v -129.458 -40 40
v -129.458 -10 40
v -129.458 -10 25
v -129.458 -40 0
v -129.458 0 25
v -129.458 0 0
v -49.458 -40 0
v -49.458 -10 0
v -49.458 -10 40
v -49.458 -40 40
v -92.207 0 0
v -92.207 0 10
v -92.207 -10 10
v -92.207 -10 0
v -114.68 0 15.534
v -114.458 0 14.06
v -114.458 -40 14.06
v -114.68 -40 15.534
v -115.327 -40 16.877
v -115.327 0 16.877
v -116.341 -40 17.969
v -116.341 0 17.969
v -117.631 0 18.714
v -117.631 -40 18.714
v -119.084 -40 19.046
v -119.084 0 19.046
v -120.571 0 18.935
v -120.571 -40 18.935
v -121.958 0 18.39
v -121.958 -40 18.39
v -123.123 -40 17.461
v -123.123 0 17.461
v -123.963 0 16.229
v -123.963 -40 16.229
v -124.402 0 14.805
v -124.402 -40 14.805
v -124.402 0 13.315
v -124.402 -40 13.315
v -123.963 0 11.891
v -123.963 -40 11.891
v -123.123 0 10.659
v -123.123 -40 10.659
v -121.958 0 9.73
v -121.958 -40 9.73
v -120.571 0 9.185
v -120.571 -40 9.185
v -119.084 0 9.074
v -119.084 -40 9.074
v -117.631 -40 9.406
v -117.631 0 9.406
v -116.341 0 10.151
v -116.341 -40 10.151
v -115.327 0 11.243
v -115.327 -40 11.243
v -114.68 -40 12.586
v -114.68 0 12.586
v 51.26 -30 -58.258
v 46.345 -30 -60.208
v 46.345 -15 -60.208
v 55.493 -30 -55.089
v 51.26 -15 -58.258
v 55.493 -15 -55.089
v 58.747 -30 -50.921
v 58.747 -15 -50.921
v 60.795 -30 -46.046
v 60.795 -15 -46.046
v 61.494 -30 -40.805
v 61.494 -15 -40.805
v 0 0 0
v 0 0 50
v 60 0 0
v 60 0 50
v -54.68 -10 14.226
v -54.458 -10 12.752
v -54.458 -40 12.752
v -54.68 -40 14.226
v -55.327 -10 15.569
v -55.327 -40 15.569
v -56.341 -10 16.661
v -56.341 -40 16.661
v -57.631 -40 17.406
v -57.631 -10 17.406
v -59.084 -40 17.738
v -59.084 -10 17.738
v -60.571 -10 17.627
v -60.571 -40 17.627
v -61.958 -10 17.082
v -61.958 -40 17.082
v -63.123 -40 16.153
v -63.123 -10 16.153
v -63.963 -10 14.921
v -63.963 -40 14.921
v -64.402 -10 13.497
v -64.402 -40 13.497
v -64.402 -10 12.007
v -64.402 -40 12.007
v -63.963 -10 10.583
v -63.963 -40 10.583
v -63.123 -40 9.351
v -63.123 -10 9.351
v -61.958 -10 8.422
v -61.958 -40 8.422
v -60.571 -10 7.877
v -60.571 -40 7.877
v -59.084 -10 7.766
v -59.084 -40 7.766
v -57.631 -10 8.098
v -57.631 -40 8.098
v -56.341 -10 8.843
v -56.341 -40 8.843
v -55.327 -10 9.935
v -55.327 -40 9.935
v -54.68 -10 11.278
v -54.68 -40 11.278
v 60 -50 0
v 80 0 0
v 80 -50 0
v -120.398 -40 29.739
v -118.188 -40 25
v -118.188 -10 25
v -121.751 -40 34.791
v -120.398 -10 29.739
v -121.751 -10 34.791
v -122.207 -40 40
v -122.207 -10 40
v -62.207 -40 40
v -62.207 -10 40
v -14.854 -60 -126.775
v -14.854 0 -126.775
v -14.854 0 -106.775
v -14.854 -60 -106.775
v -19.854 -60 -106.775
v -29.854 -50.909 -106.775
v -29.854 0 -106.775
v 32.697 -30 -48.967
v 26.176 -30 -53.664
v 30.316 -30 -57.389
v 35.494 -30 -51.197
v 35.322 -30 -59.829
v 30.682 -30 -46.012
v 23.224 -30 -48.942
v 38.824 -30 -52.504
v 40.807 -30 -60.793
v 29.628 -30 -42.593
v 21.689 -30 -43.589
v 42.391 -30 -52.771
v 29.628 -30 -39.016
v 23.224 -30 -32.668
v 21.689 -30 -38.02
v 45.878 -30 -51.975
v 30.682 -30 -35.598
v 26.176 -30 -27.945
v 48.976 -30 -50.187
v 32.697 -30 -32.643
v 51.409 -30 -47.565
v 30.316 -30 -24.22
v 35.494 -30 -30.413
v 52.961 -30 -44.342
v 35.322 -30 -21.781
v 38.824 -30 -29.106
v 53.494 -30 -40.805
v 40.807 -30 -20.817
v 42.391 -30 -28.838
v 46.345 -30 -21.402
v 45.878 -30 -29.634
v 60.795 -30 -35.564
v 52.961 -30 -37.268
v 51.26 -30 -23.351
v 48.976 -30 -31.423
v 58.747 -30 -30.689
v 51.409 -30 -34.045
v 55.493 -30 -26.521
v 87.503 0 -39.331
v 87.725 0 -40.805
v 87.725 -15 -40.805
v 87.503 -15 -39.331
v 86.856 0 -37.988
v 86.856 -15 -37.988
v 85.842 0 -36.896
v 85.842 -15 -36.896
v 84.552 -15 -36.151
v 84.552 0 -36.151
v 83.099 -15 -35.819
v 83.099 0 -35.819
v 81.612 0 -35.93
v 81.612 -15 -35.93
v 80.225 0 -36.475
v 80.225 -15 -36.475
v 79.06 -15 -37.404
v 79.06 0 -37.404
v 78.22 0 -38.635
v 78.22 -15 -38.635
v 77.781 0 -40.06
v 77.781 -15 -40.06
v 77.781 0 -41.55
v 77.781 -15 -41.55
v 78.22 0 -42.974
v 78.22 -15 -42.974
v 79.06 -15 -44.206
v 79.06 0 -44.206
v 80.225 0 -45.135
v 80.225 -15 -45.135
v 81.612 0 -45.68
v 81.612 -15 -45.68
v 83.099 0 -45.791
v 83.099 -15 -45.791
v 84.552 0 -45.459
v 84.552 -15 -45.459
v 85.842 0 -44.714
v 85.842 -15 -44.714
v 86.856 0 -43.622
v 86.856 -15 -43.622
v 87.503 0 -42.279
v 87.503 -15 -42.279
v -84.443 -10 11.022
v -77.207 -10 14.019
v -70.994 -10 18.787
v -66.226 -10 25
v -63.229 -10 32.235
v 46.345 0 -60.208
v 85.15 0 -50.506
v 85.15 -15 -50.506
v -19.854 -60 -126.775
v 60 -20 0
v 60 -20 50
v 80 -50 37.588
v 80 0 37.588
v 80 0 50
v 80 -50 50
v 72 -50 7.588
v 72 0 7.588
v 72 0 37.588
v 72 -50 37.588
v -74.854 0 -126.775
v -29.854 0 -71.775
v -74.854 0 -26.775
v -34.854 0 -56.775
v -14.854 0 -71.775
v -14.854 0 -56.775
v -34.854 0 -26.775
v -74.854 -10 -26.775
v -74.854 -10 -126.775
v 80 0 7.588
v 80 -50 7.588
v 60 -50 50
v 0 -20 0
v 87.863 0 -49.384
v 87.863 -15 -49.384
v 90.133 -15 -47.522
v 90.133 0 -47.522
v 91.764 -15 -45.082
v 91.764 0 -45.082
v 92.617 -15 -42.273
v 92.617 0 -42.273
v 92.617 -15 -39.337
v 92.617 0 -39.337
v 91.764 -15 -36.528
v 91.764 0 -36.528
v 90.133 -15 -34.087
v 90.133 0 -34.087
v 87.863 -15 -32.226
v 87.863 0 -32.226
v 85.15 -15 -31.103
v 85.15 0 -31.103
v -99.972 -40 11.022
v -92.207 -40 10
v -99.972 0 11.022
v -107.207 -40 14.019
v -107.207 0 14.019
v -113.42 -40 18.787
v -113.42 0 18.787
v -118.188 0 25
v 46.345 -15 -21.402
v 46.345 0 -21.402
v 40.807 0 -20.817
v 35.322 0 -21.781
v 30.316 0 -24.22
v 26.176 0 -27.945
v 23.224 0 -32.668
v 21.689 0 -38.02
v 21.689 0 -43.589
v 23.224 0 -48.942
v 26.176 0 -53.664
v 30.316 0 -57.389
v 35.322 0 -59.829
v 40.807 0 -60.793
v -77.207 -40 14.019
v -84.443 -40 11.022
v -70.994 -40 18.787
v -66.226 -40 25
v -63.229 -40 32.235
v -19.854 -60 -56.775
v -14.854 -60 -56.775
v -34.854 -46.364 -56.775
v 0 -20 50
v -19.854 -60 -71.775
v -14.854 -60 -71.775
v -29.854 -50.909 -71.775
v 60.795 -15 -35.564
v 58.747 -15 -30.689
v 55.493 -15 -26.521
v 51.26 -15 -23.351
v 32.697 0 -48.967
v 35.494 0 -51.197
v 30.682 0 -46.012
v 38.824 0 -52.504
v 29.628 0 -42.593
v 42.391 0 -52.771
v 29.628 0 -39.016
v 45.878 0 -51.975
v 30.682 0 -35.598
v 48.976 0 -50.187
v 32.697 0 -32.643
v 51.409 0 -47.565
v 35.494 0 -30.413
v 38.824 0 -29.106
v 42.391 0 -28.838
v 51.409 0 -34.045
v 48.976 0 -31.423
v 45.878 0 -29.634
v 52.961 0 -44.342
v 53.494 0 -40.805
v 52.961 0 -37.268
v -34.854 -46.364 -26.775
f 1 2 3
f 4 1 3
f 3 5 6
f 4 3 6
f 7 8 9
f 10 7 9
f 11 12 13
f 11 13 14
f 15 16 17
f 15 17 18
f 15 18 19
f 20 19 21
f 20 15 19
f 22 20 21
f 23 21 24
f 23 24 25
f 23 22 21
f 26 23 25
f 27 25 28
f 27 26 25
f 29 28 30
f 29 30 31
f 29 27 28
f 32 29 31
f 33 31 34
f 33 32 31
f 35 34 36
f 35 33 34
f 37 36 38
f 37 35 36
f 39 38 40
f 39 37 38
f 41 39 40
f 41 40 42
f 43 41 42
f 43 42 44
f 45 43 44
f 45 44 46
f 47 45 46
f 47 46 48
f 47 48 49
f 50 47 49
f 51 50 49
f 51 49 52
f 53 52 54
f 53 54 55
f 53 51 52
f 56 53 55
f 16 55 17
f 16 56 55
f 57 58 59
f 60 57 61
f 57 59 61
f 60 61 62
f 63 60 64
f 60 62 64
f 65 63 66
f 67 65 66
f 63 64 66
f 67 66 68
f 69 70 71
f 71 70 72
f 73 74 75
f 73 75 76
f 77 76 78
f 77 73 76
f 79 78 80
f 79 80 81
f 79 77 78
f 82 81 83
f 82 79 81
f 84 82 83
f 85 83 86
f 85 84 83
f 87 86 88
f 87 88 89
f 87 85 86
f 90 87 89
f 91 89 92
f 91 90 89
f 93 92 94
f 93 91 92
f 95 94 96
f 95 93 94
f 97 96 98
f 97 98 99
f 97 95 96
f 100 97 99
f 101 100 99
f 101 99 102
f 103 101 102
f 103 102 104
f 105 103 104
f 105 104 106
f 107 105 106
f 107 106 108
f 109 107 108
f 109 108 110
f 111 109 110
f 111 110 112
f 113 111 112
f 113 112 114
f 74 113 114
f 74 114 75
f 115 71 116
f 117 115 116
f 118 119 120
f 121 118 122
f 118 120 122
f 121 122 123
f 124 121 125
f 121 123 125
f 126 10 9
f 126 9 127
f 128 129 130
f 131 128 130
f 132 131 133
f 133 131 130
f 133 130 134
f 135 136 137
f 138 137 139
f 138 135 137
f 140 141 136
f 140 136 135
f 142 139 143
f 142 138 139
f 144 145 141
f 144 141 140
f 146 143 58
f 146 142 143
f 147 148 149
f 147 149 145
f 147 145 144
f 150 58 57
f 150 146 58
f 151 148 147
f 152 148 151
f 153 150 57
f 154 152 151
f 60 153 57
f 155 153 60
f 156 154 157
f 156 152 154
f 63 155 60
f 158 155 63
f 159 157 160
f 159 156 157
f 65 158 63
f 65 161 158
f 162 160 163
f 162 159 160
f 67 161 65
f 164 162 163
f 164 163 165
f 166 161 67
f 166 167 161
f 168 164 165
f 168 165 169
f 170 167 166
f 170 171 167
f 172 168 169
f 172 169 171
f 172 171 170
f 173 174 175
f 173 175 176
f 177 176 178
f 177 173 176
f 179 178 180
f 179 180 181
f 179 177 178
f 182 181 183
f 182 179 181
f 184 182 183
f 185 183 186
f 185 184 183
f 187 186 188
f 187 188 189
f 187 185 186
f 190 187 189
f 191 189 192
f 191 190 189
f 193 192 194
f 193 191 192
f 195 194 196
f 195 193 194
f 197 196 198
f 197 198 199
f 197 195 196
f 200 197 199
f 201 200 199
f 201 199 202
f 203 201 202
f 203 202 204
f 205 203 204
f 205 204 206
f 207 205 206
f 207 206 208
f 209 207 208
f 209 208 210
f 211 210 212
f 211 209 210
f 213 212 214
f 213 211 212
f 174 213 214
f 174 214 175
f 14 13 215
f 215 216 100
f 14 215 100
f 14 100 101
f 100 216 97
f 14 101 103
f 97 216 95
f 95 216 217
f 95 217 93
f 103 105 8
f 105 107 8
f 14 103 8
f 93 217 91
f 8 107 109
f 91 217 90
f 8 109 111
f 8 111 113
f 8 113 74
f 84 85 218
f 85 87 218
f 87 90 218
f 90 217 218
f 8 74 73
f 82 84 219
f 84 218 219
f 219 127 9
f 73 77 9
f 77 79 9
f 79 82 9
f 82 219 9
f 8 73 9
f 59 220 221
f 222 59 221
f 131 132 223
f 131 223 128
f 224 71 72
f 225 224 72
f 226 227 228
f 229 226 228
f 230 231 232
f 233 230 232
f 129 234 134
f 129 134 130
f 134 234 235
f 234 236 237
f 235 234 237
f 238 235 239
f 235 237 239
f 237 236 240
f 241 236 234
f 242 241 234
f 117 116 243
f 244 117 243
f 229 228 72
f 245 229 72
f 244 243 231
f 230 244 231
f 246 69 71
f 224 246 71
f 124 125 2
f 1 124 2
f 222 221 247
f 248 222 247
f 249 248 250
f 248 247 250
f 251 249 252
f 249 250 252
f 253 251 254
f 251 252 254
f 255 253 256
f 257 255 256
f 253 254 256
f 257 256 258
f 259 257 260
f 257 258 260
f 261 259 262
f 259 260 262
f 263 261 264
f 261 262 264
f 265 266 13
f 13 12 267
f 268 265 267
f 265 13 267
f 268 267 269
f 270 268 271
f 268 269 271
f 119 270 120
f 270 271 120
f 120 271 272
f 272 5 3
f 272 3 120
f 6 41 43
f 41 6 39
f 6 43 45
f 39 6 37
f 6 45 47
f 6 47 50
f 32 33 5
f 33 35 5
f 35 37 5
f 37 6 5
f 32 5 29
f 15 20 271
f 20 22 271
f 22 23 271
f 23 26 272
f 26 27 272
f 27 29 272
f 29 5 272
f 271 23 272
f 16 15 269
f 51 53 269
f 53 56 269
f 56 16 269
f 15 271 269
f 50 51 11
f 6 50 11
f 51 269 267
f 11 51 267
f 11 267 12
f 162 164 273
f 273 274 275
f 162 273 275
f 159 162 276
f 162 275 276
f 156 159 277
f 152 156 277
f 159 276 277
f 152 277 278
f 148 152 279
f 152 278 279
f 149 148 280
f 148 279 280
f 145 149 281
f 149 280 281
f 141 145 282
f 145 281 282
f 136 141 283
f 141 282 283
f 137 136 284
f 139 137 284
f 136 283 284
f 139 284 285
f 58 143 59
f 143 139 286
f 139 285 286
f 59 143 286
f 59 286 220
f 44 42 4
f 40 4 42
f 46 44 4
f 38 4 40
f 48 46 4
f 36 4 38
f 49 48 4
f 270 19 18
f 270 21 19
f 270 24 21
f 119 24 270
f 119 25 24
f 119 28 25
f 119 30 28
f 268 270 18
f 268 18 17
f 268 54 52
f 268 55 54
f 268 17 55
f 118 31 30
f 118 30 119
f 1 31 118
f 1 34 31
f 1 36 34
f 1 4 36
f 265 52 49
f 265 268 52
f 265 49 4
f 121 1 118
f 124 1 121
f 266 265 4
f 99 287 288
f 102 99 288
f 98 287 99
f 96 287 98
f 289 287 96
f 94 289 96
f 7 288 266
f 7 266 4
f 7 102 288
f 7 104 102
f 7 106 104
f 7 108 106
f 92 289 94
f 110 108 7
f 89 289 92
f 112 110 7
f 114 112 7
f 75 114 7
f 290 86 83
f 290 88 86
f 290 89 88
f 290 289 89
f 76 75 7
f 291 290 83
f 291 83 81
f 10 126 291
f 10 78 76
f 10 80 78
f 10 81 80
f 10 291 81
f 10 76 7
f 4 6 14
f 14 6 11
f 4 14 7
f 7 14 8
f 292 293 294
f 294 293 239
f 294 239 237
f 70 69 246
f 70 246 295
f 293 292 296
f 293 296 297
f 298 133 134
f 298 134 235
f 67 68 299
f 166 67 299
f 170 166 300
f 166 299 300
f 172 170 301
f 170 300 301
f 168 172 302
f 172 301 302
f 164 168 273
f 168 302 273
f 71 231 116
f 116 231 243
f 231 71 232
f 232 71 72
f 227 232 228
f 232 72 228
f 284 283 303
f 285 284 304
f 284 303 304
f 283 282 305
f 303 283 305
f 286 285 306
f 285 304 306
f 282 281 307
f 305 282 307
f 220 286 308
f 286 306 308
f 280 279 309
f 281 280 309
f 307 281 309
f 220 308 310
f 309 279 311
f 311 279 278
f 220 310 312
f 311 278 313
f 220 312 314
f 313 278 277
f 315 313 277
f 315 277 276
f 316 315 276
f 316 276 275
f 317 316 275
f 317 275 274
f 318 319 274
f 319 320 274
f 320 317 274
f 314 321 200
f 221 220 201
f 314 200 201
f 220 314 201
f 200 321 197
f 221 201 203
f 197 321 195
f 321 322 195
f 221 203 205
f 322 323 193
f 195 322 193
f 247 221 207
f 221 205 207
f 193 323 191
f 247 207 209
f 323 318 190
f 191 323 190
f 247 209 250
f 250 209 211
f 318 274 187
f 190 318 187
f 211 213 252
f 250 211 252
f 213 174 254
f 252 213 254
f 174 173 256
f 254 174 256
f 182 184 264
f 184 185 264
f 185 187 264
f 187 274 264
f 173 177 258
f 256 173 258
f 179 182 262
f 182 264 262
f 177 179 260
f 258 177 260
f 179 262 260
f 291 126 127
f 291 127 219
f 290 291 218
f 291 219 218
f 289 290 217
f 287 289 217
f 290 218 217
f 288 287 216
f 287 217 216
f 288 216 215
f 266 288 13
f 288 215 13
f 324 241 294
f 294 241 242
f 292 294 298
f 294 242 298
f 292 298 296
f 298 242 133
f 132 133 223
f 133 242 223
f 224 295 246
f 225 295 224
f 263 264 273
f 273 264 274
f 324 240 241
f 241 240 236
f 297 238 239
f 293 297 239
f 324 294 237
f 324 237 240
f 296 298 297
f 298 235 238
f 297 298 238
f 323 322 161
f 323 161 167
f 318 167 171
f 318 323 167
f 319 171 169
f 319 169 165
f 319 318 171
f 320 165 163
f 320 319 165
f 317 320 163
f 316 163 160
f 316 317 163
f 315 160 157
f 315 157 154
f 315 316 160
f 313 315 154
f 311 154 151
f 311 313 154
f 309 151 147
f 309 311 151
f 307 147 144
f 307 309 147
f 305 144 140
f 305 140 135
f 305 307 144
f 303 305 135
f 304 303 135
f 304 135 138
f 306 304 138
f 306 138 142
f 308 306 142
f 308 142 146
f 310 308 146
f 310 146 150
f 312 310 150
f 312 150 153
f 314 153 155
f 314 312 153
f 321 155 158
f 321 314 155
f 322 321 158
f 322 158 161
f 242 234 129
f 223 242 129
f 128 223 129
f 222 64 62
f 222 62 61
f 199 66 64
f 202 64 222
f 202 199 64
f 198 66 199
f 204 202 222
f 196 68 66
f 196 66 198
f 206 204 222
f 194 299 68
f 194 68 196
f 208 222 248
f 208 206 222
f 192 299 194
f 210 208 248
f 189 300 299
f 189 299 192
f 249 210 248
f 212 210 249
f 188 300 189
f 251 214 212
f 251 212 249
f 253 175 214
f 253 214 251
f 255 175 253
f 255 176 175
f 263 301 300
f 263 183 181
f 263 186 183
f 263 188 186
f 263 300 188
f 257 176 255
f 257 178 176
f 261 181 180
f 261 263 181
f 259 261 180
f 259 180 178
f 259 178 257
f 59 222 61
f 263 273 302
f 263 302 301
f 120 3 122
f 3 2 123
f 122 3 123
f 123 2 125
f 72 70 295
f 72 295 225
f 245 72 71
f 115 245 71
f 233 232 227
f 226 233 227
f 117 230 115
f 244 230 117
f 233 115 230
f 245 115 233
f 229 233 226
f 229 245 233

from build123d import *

# Parameters (mm, degrees)
F0_W      = 60
F0_H      = 50
F1_DEPTH  = 20
F2_DEPTH  = 50
F3_R      = 12
F4_DEPTH  = 30
F3_R_2    = 5
F5_DEPTH  = 15
F6_R      = 5
F7_DEPTH  = 40
F8_DEPTH  = 10
F10_DEPTH = 60
F12_DEPTH = 176.7762565444


with BuildPart() as f1:
    # F0 (on Front) → F1 (new body)
    with BuildSketch(Plane.XZ):
        with Locations((30, 25)):
            Rectangle(F0_W, F0_H)
    extrude(amount=F1_DEPTH)


with BuildPart() as f2:
    # F0 (on Front) → F2 (new body)
    with BuildSketch(Plane.XZ):
        Polygon((60, 50), (60, 0), (80, 0), (80, 7.5881431788), (72, 7.5881431788), (72, 37.5881431788), (80, 37.5881431788), (80, 50), align=None)
    extrude(amount=F2_DEPTH)


with BuildPart() as f4:
    # F3 (on Front) → F4 (new body)
    with BuildSketch(Plane.XZ):
        with BuildLine():
            ThreePointArc((46.3445479762, -60.2077629417), (57.2579442358, -53.1131571268), (61.4938354755, -40.8049129388))
            ThreePointArc((61.4938354755, -40.8049129388), (57.2579442358, -28.4966687507), (46.3445479762, -21.4020629359))
            ThreePointArc((46.3445479762, -21.4020629359), (21.4938354755, -40.8049129388), (46.3445479762, -60.2077629417))
        make_face()
        with Locations((41.4938354755, -40.8049129388)):
            Circle(F3_R, mode=Mode.SUBTRACT)
    extrude(amount=F4_DEPTH)

    # F3 (on Front) → F5 (join)
    with BuildSketch(Plane.XZ):
        with BuildLine():
            ThreePointArc((46.3445479762, -21.4020629359), (57.2579442358, -28.4966687507), (61.4938354755, -40.8049129388))
            ThreePointArc((61.4938354755, -40.8049129388), (57.2579442358, -53.1131571268), (46.3445479762, -60.2077629417))
            Line((46.3445479762, -60.2077629417), (85.1502479821, -50.5063379402))
            ThreePointArc((85.1502479821, -50.5063379402), (92.7248917317, -40.8049129388), (85.1502479821, -31.1034879373))
            Line((85.1502479821, -31.1034879373), (46.3445479762, -21.4020629359))
        make_face()
        with Locations((82.7248917317, -40.8049129388)):
            Circle(F3_R_2, mode=Mode.SUBTRACT)
    extrude(amount=F5_DEPTH)


with BuildPart() as f7:
    # F6 (on Front) → F7 (new body)
    with BuildSketch(Plane.XZ):
        with BuildLine():
            Line((-129.4579889352, 40), (-129.4579889352, 25))
            Line((-129.4579889352, 25), (-118.187835116, 25))
            ThreePointArc((-118.187835116, 25), (-121.1848477911, 32.2354286469), (-122.2070730024, 40))
            Line((-122.2070730024, 40), (-129.4579889352, 40))
        make_face()
        with BuildLine():
            Line((-129.4579889352, 0), (-92.2070730024, 0))
            Line((-92.2070730024, 0), (-92.2070730024, 10))
            ThreePointArc((-92.2070730024, 10), (-107.2070730024, 14.0192378865), (-118.187835116, 25))
            Line((-118.187835116, 25), (-129.4579889352, 25))
            Line((-129.4579889352, 25), (-129.4579889352, 0))
        make_face()
        with Locations((-119.4579889352, 14.0599424131)):
            Circle(F6_R, mode=Mode.SUBTRACT)
        with BuildLine():
            Line((-92.2070730024, 0), (-49.4579889352, 0))
            Line((-49.4579889352, 0), (-49.4579889352, 40))
            Line((-49.4579889352, 40), (-62.2070730024, 40))
            ThreePointArc((-62.2070730024, 40), (-70.9938695668, 18.7867965644), (-92.2070730024, 10))
            Line((-92.2070730024, 10), (-92.2070730024, 0))
        make_face()
        with Locations((-59.4579889352, 12.7520402892)):
            Circle(F6_R, mode=Mode.SUBTRACT)
    extrude(amount=F7_DEPTH)

    # F6 (on Front) → F8 (cut)
    with BuildSketch(Plane.XZ):
        with BuildLine():
            Line((-129.4579889352, 40), (-129.4579889352, 25))
            Line((-129.4579889352, 25), (-118.187835116, 25))
            ThreePointArc((-118.187835116, 25), (-121.1848477911, 32.2354286469), (-122.2070730024, 40))
            Line((-122.2070730024, 40), (-129.4579889352, 40))
        make_face()
        with BuildLine():
            Line((-92.2070730024, 0), (-49.4579889352, 0))
            Line((-49.4579889352, 0), (-49.4579889352, 40))
            Line((-49.4579889352, 40), (-62.2070730024, 40))
            ThreePointArc((-62.2070730024, 40), (-70.9938695668, 18.7867965644), (-92.2070730024, 10))
            Line((-92.2070730024, 10), (-92.2070730024, 0))
        make_face()
        with Locations((-59.4579889352, 12.7520402892)):
            Circle(F6_R, mode=Mode.SUBTRACT)
    extrude(amount=F8_DEPTH, mode=Mode.SUBTRACT)


with BuildPart() as f10:
    # F9 (on Front) → F10 (new body)
    with BuildSketch(Plane.XZ):
        Polygon((-74.8537646009, -26.7752565444), (-74.8537646009, -126.7752565444), (-14.8537646009, -126.7752565444), (-14.8537646009, -106.7752565444), (-29.8537646009, -106.7752565444), (-29.8537646009, -71.7752565444), (-14.8537646009, -71.7752565444), (-14.8537646009, -56.7752565444), (-34.8537646009, -56.7752565444), (-34.8537646009, -26.7752565444), align=None)
    extrude(amount=F10_DEPTH)

    # F11 (on face) → F12 (cut, through all)
    with BuildSketch(Plane(origin=(0, 0, -126.7752565444), x_dir=(1, 0, 0), z_dir=(0, 0, -1))):
        Polygon((-74.8537646009, 60), (-74.8537646009, 10), (-19.8537646009, 60), align=None)
    extrude(amount=-F12_DEPTH, mode=Mode.SUBTRACT)


solid = Compound([f1.part, f2.part, f4.part, f7.part, f10.part])
